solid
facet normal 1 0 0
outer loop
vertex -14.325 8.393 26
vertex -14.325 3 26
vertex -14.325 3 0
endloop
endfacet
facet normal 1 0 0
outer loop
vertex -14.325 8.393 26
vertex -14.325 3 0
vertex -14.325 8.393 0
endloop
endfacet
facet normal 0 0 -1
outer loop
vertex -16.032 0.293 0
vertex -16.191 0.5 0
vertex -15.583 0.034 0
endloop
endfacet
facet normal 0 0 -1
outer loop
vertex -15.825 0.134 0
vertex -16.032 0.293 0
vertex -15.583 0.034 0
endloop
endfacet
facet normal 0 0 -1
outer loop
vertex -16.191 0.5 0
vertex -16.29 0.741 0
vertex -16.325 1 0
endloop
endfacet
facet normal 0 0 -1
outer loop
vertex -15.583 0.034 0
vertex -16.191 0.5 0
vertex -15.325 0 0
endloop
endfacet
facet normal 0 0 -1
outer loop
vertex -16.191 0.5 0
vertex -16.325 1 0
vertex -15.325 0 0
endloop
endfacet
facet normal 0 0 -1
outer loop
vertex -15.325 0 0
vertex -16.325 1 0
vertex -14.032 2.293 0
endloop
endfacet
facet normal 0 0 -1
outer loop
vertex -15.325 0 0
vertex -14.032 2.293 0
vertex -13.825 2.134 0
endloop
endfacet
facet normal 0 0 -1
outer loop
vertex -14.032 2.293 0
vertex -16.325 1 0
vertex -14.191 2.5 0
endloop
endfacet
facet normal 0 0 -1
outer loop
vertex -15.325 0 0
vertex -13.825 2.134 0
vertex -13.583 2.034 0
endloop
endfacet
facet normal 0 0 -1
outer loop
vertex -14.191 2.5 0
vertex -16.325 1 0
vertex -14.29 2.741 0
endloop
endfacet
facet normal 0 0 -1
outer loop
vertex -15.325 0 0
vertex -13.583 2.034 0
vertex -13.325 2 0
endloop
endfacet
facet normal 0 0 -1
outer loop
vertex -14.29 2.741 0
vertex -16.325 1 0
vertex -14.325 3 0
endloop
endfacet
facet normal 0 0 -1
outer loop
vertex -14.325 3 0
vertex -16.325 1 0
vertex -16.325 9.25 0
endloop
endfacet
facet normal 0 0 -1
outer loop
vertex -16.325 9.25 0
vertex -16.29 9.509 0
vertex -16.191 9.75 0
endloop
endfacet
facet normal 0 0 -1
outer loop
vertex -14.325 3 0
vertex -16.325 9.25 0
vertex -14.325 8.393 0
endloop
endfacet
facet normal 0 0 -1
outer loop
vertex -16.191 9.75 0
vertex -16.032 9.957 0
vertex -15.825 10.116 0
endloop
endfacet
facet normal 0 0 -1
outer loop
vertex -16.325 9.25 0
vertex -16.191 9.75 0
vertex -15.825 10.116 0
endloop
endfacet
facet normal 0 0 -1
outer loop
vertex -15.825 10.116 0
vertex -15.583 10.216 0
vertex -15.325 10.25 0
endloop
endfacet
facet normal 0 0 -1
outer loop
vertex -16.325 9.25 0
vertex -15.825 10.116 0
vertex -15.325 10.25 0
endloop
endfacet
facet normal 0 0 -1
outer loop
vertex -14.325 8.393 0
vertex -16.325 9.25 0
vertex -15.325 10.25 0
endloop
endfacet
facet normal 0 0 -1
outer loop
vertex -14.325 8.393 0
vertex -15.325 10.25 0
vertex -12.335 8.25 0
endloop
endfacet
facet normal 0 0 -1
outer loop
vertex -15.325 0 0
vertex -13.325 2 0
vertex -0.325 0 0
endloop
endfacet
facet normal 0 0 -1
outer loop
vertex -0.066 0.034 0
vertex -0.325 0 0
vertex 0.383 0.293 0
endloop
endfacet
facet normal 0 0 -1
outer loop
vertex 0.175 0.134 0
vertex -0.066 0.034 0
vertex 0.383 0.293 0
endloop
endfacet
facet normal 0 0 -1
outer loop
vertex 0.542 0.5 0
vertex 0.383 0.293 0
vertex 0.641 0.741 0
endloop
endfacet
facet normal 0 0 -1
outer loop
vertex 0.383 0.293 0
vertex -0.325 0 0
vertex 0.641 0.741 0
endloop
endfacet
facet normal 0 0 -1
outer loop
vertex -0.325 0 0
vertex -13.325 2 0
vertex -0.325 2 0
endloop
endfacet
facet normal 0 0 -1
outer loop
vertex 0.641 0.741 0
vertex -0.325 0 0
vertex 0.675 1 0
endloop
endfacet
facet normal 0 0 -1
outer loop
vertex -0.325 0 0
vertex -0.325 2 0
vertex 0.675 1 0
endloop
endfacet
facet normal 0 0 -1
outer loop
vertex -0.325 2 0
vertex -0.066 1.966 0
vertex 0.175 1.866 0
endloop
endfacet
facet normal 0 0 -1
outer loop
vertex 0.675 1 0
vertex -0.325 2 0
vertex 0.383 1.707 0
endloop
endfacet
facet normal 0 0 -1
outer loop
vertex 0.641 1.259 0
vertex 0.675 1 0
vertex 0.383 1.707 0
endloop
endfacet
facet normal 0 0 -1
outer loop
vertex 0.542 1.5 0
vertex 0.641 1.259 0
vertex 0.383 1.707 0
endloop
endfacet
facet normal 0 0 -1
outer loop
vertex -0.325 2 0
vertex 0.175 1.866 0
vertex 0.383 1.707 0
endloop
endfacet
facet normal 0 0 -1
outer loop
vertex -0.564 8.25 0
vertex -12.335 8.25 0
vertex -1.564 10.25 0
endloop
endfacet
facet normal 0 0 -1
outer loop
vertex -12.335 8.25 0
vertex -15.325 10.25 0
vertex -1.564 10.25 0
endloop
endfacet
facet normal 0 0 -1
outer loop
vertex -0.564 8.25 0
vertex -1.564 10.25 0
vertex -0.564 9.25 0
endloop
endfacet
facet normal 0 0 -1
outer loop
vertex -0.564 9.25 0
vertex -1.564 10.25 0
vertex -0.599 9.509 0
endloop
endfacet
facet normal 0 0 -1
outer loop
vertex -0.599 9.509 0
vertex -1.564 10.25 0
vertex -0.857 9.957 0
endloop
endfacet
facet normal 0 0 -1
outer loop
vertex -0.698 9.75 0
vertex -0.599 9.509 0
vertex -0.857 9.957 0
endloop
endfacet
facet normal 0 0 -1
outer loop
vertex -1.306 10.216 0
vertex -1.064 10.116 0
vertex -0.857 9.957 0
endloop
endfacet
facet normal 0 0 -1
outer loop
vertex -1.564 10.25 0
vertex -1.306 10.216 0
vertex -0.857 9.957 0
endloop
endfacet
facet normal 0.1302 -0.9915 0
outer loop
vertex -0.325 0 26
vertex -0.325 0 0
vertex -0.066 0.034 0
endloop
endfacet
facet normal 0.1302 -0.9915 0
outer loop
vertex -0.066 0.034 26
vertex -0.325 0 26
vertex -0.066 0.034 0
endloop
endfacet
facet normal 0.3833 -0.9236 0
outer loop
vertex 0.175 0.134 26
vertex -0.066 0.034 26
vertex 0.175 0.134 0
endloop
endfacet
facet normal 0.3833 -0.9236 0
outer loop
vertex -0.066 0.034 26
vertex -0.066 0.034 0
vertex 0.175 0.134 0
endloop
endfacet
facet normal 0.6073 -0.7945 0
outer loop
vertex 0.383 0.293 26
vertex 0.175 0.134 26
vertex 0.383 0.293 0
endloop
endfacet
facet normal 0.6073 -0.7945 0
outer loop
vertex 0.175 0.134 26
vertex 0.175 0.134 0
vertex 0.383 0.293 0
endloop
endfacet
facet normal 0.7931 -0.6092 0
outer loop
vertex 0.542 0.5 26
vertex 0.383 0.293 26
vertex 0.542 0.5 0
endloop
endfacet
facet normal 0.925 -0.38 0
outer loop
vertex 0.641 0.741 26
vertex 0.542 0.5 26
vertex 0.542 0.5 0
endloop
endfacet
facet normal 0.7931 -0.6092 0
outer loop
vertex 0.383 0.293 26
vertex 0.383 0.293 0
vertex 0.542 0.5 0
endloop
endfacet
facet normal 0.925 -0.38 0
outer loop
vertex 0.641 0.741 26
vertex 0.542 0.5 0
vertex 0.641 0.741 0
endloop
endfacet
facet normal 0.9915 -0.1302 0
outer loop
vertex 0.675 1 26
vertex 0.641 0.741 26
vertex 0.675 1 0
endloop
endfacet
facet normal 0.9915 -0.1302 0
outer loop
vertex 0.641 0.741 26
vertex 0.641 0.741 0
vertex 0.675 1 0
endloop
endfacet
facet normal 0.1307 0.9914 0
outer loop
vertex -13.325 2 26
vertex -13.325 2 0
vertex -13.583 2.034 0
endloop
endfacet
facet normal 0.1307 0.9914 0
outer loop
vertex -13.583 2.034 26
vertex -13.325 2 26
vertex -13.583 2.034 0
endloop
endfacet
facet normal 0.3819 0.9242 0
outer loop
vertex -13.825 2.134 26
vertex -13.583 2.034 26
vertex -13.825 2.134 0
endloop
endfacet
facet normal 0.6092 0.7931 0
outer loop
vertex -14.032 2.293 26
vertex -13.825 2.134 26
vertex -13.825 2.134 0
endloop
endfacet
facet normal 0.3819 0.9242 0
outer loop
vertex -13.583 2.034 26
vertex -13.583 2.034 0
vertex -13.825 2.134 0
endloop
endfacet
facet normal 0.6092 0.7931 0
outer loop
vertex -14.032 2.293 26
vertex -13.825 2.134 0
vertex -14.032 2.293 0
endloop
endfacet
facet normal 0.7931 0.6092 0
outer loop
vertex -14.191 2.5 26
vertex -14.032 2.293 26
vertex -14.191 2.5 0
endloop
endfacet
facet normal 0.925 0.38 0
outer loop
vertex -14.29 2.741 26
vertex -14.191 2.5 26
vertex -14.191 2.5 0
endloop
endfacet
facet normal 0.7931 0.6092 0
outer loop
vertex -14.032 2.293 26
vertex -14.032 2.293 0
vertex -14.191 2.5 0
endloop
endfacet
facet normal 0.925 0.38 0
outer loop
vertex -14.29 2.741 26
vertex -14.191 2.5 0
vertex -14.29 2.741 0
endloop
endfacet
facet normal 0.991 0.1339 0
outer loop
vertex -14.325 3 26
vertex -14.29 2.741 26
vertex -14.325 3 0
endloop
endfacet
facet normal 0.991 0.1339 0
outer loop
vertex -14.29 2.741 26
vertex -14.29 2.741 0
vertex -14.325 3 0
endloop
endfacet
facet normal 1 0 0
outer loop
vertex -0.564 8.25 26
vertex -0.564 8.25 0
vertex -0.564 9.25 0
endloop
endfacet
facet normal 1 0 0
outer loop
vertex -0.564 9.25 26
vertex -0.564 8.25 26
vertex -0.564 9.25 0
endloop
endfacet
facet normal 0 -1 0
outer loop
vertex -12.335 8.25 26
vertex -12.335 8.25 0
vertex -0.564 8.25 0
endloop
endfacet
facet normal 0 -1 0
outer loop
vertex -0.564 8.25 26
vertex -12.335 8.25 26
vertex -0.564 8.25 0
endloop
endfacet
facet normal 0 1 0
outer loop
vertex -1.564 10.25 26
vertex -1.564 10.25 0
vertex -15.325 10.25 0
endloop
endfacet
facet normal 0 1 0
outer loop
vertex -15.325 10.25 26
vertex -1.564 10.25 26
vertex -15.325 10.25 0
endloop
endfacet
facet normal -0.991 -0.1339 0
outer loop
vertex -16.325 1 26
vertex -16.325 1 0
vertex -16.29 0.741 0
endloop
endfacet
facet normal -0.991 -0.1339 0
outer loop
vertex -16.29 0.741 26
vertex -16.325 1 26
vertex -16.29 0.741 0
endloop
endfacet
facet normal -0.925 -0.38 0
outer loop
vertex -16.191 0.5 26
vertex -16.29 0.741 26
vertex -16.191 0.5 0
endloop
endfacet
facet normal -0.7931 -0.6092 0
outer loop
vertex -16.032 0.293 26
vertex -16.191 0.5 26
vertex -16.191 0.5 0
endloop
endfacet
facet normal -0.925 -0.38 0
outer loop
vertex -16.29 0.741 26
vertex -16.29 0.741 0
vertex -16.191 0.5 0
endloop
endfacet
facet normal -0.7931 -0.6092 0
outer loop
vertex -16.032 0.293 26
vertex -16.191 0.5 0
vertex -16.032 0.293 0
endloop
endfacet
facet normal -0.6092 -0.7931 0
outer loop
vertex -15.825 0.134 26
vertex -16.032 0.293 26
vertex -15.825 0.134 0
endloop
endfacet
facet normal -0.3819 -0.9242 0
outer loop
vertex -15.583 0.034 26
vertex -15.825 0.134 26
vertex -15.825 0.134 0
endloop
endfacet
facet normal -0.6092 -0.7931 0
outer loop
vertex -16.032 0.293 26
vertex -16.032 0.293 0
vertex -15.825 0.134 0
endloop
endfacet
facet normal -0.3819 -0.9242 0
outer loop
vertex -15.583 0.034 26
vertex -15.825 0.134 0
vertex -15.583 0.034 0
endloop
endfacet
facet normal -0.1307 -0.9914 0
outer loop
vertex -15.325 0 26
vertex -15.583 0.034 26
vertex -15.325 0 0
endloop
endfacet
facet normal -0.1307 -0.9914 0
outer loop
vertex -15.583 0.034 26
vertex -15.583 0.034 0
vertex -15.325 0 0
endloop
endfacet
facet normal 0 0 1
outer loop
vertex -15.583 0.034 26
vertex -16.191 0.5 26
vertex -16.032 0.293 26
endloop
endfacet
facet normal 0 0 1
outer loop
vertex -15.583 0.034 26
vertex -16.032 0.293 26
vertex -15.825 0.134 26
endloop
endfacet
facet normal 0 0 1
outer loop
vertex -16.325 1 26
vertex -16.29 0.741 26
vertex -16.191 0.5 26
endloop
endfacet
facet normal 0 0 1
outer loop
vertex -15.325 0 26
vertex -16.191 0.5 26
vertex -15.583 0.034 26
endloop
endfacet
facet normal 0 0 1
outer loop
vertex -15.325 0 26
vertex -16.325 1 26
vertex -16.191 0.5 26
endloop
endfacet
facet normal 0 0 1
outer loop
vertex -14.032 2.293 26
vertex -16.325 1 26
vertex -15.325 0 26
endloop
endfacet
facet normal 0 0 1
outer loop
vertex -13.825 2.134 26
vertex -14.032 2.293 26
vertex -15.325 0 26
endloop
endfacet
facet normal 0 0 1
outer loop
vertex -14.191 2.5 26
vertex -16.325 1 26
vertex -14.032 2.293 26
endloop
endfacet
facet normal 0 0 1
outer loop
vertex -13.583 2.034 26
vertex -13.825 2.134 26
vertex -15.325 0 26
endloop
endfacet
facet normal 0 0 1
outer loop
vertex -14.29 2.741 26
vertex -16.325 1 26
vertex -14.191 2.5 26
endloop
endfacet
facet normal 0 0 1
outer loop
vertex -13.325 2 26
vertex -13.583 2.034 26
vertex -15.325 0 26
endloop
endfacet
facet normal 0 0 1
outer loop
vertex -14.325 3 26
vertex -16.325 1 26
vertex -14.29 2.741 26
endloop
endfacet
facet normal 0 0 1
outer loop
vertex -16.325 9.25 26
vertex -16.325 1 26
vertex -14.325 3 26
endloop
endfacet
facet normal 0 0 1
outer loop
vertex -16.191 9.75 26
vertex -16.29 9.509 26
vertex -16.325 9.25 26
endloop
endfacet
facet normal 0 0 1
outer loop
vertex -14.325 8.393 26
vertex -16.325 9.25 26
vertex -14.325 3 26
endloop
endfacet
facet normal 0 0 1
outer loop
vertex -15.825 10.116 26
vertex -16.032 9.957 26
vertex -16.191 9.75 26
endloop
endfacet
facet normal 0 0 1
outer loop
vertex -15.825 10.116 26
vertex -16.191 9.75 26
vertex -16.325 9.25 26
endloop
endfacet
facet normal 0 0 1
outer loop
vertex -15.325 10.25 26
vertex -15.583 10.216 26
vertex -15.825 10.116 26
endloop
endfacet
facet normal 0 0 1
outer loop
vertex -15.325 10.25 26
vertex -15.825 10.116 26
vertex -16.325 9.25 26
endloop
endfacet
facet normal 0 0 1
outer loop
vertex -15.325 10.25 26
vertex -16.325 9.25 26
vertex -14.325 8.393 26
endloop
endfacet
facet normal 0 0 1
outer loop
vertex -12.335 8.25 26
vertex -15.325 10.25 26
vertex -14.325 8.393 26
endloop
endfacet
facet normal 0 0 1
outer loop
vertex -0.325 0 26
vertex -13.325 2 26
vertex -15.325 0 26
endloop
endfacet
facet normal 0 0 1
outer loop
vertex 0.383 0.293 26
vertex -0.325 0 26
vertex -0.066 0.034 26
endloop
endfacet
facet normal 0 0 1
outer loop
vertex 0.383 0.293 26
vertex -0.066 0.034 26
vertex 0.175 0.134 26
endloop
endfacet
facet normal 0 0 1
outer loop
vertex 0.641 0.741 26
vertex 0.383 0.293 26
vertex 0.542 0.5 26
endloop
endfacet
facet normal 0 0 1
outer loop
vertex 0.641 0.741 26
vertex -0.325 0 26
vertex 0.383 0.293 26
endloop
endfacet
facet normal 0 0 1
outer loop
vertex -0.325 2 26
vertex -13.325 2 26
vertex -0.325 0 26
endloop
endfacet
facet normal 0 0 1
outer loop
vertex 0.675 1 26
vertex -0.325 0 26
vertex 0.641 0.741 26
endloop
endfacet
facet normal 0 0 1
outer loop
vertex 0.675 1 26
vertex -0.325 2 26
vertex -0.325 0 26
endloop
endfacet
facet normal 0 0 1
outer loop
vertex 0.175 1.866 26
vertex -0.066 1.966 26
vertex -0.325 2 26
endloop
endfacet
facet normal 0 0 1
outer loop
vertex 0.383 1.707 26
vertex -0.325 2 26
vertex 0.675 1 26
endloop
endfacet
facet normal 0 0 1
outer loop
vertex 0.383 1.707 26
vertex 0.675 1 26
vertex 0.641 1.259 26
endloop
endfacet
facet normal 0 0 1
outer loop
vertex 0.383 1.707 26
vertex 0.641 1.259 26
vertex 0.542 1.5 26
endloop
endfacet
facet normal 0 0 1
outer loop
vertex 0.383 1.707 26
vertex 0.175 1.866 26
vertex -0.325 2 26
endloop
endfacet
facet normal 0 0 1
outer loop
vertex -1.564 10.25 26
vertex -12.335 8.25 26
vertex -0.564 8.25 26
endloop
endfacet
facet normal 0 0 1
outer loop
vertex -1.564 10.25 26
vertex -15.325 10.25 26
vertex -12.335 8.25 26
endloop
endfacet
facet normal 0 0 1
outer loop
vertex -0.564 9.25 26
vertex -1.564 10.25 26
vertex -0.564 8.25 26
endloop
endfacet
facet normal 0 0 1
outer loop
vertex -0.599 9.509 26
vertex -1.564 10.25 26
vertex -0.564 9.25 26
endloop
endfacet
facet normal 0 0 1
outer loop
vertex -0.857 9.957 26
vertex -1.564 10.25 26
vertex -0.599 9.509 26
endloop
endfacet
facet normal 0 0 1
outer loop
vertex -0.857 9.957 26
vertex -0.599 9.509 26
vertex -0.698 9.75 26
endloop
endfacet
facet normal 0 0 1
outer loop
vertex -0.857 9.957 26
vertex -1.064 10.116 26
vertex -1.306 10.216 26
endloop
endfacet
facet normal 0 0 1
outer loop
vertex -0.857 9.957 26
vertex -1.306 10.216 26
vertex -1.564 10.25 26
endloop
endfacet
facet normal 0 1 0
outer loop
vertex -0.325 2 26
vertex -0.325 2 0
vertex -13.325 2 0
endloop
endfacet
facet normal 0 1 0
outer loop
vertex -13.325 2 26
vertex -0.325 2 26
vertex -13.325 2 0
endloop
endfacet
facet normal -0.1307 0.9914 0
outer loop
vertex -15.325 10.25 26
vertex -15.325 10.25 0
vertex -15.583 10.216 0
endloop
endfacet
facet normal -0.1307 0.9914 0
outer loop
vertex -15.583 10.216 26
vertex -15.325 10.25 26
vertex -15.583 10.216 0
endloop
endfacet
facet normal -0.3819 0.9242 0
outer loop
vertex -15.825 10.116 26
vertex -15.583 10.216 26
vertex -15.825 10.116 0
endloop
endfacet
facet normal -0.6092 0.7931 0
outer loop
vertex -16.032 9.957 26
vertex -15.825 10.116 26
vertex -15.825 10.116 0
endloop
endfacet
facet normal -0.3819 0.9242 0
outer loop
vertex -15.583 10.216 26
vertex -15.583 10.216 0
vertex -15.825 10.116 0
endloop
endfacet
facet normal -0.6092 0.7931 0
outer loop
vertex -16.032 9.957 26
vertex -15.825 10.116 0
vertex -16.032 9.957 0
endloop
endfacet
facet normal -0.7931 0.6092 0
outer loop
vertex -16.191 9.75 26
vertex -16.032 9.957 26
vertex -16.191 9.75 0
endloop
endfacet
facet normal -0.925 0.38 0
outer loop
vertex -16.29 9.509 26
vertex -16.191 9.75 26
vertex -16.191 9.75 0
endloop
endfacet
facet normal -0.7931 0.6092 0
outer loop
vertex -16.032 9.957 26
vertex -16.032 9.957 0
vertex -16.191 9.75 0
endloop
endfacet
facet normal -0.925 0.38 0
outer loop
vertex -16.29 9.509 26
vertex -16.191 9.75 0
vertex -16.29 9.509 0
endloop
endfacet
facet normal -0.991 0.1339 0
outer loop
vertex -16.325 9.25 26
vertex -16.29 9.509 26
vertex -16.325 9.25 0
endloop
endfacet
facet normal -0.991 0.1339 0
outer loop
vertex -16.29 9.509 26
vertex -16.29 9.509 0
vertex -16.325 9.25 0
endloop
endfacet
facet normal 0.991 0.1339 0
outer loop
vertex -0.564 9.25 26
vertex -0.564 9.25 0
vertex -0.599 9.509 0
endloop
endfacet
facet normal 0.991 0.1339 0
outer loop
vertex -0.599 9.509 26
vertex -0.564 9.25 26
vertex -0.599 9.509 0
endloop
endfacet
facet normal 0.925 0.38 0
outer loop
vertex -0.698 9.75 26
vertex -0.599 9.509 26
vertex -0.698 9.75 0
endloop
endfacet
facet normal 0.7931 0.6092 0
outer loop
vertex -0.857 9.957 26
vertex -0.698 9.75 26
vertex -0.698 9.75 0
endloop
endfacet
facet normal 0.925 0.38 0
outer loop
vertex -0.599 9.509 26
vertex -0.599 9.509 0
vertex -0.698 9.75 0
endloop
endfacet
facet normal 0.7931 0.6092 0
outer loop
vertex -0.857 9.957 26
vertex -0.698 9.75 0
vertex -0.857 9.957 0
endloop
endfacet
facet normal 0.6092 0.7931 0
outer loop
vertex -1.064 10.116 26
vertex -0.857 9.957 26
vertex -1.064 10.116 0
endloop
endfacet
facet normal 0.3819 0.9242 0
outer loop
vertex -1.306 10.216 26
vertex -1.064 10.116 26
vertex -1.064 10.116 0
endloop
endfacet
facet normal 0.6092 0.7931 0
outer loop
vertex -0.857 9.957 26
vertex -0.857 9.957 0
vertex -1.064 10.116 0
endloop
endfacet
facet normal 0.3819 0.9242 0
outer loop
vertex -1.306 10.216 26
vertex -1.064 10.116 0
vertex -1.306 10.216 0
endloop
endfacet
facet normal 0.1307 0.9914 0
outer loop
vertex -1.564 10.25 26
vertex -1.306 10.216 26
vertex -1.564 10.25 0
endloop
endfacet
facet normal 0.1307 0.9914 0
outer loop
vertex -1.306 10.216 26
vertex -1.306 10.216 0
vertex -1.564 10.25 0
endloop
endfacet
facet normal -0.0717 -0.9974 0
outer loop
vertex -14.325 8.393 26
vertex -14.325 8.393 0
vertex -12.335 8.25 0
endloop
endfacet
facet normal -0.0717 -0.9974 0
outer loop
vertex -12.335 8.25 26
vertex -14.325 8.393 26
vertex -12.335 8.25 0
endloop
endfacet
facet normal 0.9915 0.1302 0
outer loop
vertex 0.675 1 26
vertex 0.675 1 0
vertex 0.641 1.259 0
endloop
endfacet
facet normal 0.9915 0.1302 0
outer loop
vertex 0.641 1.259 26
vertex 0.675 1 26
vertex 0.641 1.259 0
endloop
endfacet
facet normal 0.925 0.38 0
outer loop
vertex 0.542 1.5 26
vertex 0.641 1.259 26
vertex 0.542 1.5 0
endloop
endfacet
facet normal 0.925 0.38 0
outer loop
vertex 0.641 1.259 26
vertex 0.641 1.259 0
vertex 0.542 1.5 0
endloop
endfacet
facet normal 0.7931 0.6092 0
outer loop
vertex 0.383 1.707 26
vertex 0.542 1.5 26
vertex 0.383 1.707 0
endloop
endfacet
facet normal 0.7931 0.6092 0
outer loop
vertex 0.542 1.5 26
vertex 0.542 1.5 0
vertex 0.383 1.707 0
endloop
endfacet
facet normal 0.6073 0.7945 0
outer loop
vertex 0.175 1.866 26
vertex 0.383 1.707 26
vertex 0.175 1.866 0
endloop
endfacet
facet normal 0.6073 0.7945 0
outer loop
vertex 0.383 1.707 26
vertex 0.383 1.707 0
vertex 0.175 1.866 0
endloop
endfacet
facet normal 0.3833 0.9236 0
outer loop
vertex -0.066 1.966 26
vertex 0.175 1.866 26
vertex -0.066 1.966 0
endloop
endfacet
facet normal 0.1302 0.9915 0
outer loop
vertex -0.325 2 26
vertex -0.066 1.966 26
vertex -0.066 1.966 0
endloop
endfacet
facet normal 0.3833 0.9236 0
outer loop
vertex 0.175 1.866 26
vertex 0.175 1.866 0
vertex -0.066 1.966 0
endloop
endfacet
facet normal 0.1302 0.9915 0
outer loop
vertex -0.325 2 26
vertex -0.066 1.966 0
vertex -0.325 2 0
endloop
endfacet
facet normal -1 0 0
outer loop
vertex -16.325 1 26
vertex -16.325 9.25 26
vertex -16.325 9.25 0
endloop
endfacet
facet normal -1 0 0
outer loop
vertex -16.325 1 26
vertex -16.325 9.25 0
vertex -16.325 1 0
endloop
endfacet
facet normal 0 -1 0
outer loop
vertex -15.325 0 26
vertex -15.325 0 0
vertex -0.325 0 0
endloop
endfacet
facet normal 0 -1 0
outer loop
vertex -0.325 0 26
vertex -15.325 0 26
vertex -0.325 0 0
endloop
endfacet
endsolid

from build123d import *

# Parameters (mm, degrees)
F1_DEPTH = 26


with BuildPart() as f1:
    # F0 (on Top) → F1 (new body)
    with BuildSketch(Plane.XY):
        with BuildLine():
            ThreePointArc((-16.324504, 1), (-16.03161, 0.292893), (-15.324504, 0))
            Line((-15.324504, 0), (-0.324504, 0))
            ThreePointArc((-0.324504, 0), (0.382603, 0.292893), (0.675496, 1))
            ThreePointArc((0.675496, 1), (0.382603, 1.707107), (-0.324504, 2))
            Line((-0.324504, 2), (-13.324504, 2))
            ThreePointArc((-13.324504, 2), (-14.03161, 2.292893), (-14.324504, 3))
            Line((-14.324504, 3), (-14.324504, 8.393347))
            ThreePointArc((-14.324504, 8.393347), (-13.252645, 9.390761), (-12.334831, 8.25))
            Line((-12.334831, 8.25), (-0.564496, 8.25))
            Line((-0.564496, 8.25), (-0.564496, 8.948101))
            Line((-0.564496, 8.948101), (-0.564496, 9.25))
            ThreePointArc((-0.564496, 9.25), (-0.857389, 9.957107), (-1.564496, 10.25))
            Line((-1.564496, 10.25), (-15.324504, 10.25))
            ThreePointArc((-15.324504, 10.25), (-16.03161, 9.957107), (-16.324504, 9.25))
            Line((-16.324504, 9.25), (-16.324504, 1))
        make_face()
        with BuildLine():
            ThreePointArc((-12.334831, 8.25), (-13.252645, 9.390761), (-14.324504, 8.393347))
            Line((-14.324504, 8.393347), (-12.334831, 8.25))
        make_face()
    extrude(amount=F1_DEPTH)


solid = f1.part
